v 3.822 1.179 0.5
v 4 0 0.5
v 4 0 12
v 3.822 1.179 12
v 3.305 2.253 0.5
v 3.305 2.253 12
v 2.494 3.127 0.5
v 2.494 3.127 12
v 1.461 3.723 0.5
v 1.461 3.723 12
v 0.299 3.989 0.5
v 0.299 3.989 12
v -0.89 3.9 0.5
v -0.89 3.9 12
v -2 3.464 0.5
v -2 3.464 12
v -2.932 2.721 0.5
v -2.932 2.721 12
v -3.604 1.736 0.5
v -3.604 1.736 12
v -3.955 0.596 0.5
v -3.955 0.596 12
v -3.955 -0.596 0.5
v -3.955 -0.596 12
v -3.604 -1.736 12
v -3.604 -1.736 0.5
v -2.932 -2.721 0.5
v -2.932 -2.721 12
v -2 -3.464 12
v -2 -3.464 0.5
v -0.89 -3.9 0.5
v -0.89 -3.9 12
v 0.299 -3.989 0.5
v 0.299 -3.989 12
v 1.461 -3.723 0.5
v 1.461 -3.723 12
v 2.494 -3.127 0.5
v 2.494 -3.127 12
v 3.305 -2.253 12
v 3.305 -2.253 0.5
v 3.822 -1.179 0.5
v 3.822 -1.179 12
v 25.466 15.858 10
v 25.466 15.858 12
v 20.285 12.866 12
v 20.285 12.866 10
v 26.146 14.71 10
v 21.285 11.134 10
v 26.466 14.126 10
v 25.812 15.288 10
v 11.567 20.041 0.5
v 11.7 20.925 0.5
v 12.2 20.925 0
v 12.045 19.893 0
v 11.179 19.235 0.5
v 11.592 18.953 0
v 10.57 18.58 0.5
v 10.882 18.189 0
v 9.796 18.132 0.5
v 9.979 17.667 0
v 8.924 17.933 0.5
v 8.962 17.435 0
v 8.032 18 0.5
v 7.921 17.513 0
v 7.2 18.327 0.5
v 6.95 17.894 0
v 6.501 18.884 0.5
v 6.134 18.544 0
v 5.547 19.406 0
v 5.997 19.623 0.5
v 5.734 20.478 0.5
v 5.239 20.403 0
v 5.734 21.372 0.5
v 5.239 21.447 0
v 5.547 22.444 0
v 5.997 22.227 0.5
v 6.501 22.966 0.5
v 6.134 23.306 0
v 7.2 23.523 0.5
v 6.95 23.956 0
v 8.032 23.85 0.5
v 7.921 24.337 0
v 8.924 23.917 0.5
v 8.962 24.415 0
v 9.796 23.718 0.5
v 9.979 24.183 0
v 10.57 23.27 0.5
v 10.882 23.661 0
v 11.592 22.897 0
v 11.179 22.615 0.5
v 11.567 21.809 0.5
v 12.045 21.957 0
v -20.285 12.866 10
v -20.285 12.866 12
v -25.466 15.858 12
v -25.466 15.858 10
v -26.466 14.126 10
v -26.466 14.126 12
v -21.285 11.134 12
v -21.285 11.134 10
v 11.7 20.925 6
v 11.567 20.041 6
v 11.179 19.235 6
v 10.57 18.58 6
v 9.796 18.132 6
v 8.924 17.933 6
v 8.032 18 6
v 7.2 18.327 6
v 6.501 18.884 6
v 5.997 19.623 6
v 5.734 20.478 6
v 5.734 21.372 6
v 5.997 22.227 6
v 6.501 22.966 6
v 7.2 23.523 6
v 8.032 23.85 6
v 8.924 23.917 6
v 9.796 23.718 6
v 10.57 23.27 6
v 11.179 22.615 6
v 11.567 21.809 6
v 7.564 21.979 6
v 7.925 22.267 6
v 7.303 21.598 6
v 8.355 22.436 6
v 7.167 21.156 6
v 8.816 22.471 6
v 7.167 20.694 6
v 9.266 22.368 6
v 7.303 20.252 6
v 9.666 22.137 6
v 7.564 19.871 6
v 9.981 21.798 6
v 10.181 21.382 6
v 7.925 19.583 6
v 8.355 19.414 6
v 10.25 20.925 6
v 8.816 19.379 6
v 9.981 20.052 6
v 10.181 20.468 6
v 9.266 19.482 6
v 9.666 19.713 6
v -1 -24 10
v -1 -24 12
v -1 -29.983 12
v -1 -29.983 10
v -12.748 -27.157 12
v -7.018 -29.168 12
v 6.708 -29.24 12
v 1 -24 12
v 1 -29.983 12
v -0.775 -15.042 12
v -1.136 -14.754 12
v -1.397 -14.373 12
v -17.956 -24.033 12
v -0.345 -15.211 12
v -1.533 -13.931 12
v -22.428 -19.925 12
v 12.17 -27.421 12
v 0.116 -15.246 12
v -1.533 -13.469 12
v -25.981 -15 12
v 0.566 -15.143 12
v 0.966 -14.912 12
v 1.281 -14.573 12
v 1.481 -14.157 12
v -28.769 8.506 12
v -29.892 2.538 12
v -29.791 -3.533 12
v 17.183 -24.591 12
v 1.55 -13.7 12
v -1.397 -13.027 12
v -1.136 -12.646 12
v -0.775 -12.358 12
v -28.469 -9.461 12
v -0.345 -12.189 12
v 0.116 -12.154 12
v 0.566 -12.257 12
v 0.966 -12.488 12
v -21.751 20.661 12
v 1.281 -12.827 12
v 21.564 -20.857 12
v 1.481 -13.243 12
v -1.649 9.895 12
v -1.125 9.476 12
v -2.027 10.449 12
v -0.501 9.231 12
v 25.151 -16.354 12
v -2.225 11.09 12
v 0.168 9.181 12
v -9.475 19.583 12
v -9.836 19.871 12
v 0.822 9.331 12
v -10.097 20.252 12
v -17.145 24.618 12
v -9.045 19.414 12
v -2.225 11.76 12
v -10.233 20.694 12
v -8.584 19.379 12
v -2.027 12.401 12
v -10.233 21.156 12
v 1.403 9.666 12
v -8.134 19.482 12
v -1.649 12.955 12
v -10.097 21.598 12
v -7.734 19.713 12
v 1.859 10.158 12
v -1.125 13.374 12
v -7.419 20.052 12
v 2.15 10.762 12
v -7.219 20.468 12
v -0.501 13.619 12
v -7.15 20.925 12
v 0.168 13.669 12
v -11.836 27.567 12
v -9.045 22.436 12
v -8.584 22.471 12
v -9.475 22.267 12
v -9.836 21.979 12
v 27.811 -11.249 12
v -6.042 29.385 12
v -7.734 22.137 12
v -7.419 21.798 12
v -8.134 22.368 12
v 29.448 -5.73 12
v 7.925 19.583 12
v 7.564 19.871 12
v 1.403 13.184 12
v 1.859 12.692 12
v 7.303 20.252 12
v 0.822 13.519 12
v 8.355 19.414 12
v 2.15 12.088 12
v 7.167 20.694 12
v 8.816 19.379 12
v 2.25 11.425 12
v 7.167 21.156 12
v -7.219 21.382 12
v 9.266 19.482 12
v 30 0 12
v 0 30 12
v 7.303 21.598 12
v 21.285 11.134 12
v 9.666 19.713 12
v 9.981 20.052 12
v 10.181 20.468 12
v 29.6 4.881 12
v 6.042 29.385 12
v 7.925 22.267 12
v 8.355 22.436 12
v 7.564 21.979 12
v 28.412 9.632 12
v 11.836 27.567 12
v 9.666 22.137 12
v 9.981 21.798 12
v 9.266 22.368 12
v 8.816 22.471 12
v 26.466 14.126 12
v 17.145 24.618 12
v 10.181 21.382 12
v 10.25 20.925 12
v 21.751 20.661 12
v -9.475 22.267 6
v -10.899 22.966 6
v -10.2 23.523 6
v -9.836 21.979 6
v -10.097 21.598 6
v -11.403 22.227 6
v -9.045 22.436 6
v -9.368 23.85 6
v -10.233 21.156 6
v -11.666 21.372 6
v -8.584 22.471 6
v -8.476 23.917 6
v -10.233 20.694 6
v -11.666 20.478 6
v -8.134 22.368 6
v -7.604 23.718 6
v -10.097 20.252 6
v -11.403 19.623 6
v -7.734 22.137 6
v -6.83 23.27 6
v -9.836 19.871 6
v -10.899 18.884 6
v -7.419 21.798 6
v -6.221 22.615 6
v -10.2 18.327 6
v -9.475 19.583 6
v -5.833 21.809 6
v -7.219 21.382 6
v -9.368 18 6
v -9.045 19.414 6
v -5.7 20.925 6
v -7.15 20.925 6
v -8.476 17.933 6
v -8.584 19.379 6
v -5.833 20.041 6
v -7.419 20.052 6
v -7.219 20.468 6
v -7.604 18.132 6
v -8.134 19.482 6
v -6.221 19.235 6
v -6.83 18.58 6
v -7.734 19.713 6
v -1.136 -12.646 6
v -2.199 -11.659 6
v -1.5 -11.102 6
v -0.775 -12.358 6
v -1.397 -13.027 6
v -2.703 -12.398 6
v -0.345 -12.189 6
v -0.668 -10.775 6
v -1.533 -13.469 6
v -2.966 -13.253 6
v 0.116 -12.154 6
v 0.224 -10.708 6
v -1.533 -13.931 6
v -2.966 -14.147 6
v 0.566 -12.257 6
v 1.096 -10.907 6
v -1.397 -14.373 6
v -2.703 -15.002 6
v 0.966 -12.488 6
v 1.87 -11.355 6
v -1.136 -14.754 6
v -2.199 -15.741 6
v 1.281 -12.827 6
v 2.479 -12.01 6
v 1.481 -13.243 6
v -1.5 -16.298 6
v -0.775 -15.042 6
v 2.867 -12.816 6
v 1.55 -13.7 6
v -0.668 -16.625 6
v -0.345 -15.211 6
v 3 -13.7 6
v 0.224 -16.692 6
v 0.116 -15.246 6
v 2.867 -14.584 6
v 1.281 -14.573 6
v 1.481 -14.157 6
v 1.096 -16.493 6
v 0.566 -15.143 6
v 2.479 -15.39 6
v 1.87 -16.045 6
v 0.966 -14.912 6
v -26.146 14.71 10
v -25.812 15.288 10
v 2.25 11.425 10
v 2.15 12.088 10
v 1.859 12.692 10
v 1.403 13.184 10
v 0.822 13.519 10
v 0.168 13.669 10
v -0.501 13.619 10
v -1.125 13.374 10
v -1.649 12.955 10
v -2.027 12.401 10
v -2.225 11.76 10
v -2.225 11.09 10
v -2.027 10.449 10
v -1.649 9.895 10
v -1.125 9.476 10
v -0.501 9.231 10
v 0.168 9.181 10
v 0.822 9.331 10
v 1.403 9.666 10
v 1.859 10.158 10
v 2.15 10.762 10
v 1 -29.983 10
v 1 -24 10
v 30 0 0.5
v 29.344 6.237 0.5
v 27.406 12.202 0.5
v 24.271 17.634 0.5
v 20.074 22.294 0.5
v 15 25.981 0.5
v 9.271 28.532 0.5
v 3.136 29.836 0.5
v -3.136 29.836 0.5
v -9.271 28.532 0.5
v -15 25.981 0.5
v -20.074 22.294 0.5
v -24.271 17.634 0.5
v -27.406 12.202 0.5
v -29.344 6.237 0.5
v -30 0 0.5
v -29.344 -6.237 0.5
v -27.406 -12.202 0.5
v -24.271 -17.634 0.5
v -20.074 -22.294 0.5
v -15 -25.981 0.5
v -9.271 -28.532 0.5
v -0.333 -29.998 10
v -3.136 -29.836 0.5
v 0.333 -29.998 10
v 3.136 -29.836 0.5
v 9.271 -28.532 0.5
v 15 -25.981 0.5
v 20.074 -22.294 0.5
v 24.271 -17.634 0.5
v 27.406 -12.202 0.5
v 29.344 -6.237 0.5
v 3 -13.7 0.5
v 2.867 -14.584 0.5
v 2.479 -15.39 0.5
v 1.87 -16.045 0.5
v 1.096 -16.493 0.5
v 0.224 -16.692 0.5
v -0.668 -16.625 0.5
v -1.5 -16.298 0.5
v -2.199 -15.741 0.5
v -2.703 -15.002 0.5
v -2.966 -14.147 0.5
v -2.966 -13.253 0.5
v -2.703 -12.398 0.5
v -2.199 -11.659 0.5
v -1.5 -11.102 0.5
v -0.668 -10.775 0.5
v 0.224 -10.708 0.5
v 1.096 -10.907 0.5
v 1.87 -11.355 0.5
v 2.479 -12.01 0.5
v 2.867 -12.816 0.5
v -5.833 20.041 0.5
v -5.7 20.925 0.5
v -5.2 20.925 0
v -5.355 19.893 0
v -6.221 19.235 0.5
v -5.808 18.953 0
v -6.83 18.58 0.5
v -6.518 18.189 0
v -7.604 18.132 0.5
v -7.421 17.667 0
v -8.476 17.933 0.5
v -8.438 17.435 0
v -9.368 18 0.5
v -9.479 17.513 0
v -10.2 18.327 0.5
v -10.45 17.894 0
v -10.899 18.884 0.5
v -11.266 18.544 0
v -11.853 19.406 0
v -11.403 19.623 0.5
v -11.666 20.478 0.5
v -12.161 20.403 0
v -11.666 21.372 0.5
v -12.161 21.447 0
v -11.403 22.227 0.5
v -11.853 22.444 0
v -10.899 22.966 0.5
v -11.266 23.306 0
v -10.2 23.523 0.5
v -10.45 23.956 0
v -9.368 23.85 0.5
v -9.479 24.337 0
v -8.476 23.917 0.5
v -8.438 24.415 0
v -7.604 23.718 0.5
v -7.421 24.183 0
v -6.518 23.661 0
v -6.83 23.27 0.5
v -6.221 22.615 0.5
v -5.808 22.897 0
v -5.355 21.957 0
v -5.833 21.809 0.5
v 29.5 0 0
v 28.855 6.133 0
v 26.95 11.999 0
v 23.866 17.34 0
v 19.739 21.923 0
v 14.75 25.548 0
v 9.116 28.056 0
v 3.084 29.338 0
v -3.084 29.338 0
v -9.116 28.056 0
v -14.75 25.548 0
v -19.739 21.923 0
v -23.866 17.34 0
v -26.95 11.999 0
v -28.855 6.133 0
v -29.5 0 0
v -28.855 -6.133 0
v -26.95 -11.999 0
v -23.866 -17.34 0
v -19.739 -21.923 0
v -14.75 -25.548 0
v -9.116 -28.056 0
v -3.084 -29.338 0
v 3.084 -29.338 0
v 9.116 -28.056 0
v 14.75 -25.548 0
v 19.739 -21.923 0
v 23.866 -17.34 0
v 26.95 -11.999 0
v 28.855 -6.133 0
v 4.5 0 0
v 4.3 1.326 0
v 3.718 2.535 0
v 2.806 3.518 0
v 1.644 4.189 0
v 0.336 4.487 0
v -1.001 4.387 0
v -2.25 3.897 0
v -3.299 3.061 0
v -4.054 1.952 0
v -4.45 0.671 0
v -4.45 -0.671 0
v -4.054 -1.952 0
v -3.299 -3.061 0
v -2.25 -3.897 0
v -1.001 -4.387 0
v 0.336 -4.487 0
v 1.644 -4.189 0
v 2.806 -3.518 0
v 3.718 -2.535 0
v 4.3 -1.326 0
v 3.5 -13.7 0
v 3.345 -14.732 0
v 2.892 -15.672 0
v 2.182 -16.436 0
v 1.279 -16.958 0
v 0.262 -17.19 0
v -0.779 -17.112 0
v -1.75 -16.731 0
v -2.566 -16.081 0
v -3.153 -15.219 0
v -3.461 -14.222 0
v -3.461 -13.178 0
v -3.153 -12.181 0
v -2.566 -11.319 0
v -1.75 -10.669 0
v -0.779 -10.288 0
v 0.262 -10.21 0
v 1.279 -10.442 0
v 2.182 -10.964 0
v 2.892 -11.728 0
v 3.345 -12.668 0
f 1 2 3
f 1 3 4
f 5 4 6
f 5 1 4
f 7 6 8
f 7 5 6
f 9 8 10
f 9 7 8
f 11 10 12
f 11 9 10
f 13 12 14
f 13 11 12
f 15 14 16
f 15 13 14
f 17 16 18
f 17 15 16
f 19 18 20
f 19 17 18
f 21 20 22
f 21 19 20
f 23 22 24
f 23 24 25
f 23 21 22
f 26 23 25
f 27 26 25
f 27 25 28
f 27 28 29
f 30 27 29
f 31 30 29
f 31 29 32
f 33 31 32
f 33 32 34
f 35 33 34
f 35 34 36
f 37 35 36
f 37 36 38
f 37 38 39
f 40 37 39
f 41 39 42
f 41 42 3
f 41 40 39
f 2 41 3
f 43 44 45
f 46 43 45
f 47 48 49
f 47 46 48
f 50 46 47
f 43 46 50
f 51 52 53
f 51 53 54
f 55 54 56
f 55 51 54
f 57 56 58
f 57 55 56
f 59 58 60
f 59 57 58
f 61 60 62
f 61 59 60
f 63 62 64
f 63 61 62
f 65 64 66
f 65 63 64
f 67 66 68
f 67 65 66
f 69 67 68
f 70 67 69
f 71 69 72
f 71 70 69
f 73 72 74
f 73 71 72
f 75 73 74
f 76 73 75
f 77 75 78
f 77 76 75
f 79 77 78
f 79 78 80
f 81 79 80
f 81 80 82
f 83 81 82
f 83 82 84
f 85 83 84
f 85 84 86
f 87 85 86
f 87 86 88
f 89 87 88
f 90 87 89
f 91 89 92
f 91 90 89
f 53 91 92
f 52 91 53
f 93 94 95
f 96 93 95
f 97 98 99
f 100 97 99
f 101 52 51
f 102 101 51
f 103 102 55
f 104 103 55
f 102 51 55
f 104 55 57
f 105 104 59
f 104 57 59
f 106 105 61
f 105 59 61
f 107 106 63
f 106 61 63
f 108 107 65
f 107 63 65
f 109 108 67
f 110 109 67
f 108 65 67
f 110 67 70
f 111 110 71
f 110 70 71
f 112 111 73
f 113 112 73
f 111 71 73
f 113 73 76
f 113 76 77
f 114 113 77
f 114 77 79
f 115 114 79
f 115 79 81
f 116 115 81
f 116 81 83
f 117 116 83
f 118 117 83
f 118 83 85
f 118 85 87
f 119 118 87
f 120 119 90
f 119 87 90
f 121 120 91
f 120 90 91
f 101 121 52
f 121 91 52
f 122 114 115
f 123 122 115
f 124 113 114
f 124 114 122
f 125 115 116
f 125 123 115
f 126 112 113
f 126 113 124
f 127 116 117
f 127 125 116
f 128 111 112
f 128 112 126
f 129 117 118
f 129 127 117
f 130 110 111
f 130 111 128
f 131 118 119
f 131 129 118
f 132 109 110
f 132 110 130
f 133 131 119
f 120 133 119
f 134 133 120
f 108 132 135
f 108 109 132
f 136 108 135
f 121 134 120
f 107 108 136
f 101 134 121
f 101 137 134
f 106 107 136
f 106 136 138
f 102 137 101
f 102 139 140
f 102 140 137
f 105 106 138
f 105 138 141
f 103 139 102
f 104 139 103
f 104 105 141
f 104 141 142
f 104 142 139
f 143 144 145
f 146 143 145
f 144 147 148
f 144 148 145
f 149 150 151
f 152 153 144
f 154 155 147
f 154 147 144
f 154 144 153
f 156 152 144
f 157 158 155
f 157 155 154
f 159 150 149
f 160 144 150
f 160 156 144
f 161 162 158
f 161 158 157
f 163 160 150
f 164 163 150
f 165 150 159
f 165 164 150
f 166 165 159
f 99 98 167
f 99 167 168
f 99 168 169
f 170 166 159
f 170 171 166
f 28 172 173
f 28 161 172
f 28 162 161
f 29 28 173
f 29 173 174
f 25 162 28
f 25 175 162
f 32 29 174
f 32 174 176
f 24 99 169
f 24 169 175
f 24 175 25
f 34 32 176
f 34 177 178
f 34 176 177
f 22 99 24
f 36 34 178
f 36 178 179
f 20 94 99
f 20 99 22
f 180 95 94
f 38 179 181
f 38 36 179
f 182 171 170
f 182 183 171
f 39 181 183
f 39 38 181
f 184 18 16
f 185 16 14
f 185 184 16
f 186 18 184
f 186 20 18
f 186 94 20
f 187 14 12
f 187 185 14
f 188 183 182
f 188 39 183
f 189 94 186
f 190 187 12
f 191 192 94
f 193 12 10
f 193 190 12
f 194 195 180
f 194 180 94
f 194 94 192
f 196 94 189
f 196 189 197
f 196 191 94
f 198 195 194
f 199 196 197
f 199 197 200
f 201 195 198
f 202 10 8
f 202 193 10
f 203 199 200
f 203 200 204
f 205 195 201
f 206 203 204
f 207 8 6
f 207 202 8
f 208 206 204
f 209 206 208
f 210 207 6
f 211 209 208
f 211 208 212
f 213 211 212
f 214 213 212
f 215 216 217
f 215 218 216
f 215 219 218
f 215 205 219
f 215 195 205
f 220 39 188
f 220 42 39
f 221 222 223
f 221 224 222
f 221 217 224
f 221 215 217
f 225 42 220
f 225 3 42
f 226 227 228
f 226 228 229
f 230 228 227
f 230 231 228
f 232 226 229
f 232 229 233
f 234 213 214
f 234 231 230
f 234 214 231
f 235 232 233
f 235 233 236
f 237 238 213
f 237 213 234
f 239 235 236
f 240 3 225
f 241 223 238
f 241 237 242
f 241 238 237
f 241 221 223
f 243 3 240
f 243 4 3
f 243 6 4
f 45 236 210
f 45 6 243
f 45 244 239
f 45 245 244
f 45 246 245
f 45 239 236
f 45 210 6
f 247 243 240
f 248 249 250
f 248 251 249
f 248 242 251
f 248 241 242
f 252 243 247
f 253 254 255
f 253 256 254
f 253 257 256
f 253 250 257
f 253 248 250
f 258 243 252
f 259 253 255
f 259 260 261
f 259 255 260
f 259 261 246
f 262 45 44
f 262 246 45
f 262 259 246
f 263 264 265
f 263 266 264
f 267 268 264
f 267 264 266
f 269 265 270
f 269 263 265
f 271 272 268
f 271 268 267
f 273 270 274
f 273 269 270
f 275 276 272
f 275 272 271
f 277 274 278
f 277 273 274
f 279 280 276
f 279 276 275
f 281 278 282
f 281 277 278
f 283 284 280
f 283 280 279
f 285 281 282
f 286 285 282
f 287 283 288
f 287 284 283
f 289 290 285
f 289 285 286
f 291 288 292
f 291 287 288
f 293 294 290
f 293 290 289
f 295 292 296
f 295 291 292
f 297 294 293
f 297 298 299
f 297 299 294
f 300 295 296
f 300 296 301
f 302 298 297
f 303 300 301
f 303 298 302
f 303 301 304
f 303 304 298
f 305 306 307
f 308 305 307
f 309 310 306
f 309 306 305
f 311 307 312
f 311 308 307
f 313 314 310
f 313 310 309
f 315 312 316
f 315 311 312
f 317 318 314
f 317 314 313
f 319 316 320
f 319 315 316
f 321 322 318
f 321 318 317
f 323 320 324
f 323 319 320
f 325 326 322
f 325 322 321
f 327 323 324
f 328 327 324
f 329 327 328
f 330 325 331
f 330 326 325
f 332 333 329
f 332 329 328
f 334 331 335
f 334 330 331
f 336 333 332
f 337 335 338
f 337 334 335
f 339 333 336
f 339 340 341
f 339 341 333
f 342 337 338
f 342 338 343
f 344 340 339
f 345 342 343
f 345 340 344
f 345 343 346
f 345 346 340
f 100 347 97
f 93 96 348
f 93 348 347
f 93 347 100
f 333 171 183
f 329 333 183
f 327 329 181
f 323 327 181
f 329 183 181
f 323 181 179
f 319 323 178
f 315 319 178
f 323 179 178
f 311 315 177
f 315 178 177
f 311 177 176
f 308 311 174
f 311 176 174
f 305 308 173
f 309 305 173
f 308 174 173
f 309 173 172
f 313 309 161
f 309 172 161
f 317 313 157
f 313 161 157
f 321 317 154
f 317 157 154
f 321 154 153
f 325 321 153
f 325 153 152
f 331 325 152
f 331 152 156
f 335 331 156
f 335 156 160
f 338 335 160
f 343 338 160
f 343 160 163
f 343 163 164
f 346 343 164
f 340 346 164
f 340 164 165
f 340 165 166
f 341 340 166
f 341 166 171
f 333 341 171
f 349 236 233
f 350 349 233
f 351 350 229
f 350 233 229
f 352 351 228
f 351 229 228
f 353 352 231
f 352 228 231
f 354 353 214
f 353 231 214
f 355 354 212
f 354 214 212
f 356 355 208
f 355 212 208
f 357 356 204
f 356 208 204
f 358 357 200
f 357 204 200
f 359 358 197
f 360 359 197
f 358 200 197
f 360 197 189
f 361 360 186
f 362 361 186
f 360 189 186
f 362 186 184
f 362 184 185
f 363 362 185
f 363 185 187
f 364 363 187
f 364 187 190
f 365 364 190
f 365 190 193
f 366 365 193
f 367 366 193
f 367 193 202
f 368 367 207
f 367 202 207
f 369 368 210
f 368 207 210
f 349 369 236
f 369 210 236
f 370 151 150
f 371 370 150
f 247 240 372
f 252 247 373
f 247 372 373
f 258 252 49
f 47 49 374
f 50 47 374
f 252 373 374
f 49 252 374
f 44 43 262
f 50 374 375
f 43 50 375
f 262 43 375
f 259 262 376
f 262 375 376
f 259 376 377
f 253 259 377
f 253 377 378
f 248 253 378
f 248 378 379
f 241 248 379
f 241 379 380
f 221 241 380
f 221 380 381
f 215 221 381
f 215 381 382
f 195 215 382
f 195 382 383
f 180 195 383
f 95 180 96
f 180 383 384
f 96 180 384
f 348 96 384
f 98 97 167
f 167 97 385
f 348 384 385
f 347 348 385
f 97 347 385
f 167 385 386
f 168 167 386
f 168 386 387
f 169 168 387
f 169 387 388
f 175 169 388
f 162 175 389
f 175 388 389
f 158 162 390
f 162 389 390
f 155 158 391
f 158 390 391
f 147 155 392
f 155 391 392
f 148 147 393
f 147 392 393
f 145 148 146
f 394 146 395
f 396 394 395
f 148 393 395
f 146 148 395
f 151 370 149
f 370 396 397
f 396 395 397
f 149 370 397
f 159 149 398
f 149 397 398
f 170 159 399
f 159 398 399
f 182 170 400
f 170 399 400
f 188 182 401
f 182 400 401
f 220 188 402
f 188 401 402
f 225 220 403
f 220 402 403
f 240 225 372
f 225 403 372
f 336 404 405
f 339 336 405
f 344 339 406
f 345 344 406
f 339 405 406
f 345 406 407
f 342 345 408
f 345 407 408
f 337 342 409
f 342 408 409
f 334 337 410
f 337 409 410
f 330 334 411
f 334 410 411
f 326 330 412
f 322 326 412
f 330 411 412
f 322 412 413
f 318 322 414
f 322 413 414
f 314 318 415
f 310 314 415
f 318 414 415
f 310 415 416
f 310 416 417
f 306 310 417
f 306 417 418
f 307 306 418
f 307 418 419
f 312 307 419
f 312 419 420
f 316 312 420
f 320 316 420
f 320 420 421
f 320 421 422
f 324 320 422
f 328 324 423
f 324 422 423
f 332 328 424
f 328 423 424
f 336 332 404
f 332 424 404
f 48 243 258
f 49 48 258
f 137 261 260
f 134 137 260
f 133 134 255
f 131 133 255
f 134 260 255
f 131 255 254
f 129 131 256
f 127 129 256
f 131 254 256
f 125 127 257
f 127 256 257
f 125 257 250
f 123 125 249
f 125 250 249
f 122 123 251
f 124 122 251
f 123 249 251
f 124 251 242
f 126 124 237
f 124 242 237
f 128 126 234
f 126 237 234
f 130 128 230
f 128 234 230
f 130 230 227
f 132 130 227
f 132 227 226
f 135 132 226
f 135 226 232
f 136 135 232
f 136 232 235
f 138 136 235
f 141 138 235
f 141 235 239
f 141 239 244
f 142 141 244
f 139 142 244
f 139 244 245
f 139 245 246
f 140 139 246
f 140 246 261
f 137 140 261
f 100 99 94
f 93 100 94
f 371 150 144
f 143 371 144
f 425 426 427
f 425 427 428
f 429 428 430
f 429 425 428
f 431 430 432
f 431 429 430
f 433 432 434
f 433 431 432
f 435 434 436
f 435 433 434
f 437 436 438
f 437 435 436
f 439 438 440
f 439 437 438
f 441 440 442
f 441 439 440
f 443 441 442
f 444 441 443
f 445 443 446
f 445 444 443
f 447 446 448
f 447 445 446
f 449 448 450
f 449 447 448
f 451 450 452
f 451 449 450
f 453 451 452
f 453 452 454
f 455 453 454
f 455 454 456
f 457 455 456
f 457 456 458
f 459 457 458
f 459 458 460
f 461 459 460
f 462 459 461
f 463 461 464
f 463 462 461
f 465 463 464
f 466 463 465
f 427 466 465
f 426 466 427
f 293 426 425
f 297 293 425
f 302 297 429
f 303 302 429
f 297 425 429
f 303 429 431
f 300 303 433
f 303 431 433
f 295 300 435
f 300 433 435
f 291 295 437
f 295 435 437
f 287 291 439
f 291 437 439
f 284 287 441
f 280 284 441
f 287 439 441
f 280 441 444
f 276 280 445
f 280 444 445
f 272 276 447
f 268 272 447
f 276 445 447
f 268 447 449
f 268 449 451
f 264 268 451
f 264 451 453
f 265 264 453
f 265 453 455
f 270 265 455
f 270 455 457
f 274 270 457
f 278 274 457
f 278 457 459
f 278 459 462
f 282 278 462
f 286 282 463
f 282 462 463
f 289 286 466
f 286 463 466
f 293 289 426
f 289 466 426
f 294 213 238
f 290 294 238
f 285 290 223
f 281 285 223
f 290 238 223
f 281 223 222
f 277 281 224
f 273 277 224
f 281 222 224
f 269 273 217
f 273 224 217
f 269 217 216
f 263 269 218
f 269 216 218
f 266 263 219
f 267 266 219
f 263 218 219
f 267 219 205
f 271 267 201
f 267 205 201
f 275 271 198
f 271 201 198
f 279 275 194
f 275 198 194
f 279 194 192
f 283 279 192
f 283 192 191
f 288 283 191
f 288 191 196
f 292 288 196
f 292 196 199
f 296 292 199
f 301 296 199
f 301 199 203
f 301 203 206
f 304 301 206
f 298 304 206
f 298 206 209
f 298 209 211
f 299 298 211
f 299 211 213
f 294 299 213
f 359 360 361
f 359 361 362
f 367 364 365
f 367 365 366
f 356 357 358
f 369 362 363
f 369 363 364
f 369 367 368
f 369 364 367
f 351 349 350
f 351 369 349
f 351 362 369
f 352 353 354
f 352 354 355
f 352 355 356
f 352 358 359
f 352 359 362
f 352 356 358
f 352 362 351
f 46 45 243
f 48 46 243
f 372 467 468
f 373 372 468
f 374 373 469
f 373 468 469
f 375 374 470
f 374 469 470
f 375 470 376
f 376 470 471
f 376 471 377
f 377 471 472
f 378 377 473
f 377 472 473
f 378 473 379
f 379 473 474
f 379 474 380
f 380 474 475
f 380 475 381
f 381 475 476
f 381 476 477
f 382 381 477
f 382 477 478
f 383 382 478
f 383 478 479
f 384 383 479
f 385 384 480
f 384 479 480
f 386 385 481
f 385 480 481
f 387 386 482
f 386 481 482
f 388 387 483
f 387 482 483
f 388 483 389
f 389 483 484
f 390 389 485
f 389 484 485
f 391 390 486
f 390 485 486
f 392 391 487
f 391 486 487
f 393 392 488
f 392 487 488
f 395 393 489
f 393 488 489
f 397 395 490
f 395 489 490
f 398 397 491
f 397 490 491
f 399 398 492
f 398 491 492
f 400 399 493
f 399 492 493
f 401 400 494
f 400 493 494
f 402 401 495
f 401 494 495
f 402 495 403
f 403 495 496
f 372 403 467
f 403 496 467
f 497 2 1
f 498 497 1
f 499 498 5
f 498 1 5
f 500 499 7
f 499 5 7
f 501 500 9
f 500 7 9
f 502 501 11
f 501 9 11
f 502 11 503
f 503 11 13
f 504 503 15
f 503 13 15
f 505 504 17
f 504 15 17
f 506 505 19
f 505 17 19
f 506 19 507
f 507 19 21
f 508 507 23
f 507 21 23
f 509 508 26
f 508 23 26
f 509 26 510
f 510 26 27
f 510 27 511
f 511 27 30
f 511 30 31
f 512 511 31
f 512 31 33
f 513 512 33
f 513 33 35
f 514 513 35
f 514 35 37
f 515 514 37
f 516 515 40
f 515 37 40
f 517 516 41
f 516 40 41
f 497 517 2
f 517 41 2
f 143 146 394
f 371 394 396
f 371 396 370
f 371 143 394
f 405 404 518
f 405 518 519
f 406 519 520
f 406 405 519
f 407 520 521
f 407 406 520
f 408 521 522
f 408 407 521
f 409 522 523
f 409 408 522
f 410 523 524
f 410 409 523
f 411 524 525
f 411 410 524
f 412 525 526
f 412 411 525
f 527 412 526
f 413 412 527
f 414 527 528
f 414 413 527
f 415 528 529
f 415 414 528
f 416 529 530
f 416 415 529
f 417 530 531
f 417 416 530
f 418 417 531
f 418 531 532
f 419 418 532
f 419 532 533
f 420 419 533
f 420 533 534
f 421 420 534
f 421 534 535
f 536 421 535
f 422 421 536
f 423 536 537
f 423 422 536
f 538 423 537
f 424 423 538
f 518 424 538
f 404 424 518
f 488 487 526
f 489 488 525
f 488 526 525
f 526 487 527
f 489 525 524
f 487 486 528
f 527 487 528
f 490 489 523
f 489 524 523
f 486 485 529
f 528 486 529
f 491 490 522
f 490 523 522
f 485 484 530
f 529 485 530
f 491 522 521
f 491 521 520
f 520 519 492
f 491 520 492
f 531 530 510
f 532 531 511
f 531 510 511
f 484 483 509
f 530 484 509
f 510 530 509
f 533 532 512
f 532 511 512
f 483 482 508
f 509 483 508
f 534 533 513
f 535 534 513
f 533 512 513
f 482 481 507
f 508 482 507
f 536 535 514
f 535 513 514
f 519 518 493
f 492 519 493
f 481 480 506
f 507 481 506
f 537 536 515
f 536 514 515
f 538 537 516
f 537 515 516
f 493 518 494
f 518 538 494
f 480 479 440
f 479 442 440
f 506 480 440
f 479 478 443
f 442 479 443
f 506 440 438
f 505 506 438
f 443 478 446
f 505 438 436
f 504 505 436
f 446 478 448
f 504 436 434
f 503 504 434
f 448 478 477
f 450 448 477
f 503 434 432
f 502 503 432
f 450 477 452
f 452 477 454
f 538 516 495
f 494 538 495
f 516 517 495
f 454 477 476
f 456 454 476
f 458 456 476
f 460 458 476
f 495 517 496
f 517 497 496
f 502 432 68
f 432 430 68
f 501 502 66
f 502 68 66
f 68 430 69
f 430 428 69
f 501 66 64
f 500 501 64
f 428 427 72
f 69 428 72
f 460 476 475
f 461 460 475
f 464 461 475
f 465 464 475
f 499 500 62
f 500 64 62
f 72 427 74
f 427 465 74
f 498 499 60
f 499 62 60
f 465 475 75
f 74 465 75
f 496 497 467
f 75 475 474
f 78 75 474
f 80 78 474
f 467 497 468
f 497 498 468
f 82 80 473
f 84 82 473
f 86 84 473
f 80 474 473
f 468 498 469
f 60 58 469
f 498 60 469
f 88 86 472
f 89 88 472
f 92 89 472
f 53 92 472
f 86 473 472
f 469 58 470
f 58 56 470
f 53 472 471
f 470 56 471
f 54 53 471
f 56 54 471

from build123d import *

# Parameters (mm, degrees)
F0_R     = 30
F0_R_2   = 4
F1_DEPTH = 12
F2_R     = 2.25
F3_DEPTH = 2
F4_R     = 1.55
F5_DEPTH = 25
F6_R     = 3
F7_DEPTH = 6
F9_DEPTH = 2
F10_SIZE = 0.5


with BuildPart() as f1:
    # F0 (on Top) → F1 (new body)
    with BuildSketch(Plane.XY):
        Circle(F0_R)
        Circle(F0_R_2, mode=Mode.SUBTRACT)
    extrude(amount=F1_DEPTH)

    # F2 (on face) → F3 (cut)
    with BuildSketch(Plane.XY.offset(12)):
        with Locations((0, 11.425)):
            Circle(F2_R)
    extrude(amount=-F3_DEPTH, mode=Mode.SUBTRACT)

    # F4 (on face) → F5 (cut)
    with BuildSketch(Plane.XY.offset(12)):
        with Locations((8.7, 20.925)):
            Circle(F4_R)
        with Locations((-8.7, 20.925)):
            Circle(F4_R)
        with Locations((0, -13.7)):
            Circle(F4_R)
    extrude(amount=-F5_DEPTH, mode=Mode.SUBTRACT)

    # F6 (on face) → F7 (cut)
    with BuildSketch(Plane(origin=(0, 0, 0), x_dir=(1, 0, 0), z_dir=(0, 0, -1))):
        with Locations((0, 13.7)):
            Circle(F6_R)
        with Locations((-8.7, -20.925)):
            Circle(F6_R)
        with Locations((8.7, -20.925)):
            Circle(F6_R)
    extrude(amount=-F7_DEPTH, mode=Mode.SUBTRACT)

    # F8 (on face) → F9 (cut)
    with BuildSketch(Plane.XY.offset(12)):
        with BuildLine():
            Line((21.28461, 11.133975), (26.466324, 14.125639))
            ThreePointArc((26.466324, 14.125639), (25.980762, 15), (25.466324, 15.85769))
            Line((25.466324, 15.85769), (20.28461, 12.866025))
            Line((20.28461, 12.866025), (21.28461, 11.133975))
        make_face()
        with BuildLine():
            Line((1, -29.983329), (1, -24))
            Line((1, -24), (-1, -24))
            Line((-1, -24), (-1, -29.983329))
            ThreePointArc((-1, -29.983329), (0, -30), (1, -29.983329))
        make_face()
        with BuildLine():
            Line((-20.28461, 12.866025), (-25.466324, 15.85769))
            ThreePointArc((-25.466324, 15.85769), (-25.980762, 15), (-26.466324, 14.125639))
            Line((-26.466324, 14.125639), (-21.28461, 11.133975))
            Line((-21.28461, 11.133975), (-20.28461, 12.866025))
        make_face()
    extrude(amount=-F9_DEPTH, mode=Mode.SUBTRACT)

    # F10
    f10_edges = [f1.edges().sort_by_distance(p)[0] for p in [
        (-30, 0, 0),
        (-3, -13.7, 0),
        (-4, 0, 0),
        (-11.7, 20.925, 0),
        (5.7, 20.925, 0),
    ]]
    chamfer(f10_edges, length=F10_SIZE)


solid = f1.part
